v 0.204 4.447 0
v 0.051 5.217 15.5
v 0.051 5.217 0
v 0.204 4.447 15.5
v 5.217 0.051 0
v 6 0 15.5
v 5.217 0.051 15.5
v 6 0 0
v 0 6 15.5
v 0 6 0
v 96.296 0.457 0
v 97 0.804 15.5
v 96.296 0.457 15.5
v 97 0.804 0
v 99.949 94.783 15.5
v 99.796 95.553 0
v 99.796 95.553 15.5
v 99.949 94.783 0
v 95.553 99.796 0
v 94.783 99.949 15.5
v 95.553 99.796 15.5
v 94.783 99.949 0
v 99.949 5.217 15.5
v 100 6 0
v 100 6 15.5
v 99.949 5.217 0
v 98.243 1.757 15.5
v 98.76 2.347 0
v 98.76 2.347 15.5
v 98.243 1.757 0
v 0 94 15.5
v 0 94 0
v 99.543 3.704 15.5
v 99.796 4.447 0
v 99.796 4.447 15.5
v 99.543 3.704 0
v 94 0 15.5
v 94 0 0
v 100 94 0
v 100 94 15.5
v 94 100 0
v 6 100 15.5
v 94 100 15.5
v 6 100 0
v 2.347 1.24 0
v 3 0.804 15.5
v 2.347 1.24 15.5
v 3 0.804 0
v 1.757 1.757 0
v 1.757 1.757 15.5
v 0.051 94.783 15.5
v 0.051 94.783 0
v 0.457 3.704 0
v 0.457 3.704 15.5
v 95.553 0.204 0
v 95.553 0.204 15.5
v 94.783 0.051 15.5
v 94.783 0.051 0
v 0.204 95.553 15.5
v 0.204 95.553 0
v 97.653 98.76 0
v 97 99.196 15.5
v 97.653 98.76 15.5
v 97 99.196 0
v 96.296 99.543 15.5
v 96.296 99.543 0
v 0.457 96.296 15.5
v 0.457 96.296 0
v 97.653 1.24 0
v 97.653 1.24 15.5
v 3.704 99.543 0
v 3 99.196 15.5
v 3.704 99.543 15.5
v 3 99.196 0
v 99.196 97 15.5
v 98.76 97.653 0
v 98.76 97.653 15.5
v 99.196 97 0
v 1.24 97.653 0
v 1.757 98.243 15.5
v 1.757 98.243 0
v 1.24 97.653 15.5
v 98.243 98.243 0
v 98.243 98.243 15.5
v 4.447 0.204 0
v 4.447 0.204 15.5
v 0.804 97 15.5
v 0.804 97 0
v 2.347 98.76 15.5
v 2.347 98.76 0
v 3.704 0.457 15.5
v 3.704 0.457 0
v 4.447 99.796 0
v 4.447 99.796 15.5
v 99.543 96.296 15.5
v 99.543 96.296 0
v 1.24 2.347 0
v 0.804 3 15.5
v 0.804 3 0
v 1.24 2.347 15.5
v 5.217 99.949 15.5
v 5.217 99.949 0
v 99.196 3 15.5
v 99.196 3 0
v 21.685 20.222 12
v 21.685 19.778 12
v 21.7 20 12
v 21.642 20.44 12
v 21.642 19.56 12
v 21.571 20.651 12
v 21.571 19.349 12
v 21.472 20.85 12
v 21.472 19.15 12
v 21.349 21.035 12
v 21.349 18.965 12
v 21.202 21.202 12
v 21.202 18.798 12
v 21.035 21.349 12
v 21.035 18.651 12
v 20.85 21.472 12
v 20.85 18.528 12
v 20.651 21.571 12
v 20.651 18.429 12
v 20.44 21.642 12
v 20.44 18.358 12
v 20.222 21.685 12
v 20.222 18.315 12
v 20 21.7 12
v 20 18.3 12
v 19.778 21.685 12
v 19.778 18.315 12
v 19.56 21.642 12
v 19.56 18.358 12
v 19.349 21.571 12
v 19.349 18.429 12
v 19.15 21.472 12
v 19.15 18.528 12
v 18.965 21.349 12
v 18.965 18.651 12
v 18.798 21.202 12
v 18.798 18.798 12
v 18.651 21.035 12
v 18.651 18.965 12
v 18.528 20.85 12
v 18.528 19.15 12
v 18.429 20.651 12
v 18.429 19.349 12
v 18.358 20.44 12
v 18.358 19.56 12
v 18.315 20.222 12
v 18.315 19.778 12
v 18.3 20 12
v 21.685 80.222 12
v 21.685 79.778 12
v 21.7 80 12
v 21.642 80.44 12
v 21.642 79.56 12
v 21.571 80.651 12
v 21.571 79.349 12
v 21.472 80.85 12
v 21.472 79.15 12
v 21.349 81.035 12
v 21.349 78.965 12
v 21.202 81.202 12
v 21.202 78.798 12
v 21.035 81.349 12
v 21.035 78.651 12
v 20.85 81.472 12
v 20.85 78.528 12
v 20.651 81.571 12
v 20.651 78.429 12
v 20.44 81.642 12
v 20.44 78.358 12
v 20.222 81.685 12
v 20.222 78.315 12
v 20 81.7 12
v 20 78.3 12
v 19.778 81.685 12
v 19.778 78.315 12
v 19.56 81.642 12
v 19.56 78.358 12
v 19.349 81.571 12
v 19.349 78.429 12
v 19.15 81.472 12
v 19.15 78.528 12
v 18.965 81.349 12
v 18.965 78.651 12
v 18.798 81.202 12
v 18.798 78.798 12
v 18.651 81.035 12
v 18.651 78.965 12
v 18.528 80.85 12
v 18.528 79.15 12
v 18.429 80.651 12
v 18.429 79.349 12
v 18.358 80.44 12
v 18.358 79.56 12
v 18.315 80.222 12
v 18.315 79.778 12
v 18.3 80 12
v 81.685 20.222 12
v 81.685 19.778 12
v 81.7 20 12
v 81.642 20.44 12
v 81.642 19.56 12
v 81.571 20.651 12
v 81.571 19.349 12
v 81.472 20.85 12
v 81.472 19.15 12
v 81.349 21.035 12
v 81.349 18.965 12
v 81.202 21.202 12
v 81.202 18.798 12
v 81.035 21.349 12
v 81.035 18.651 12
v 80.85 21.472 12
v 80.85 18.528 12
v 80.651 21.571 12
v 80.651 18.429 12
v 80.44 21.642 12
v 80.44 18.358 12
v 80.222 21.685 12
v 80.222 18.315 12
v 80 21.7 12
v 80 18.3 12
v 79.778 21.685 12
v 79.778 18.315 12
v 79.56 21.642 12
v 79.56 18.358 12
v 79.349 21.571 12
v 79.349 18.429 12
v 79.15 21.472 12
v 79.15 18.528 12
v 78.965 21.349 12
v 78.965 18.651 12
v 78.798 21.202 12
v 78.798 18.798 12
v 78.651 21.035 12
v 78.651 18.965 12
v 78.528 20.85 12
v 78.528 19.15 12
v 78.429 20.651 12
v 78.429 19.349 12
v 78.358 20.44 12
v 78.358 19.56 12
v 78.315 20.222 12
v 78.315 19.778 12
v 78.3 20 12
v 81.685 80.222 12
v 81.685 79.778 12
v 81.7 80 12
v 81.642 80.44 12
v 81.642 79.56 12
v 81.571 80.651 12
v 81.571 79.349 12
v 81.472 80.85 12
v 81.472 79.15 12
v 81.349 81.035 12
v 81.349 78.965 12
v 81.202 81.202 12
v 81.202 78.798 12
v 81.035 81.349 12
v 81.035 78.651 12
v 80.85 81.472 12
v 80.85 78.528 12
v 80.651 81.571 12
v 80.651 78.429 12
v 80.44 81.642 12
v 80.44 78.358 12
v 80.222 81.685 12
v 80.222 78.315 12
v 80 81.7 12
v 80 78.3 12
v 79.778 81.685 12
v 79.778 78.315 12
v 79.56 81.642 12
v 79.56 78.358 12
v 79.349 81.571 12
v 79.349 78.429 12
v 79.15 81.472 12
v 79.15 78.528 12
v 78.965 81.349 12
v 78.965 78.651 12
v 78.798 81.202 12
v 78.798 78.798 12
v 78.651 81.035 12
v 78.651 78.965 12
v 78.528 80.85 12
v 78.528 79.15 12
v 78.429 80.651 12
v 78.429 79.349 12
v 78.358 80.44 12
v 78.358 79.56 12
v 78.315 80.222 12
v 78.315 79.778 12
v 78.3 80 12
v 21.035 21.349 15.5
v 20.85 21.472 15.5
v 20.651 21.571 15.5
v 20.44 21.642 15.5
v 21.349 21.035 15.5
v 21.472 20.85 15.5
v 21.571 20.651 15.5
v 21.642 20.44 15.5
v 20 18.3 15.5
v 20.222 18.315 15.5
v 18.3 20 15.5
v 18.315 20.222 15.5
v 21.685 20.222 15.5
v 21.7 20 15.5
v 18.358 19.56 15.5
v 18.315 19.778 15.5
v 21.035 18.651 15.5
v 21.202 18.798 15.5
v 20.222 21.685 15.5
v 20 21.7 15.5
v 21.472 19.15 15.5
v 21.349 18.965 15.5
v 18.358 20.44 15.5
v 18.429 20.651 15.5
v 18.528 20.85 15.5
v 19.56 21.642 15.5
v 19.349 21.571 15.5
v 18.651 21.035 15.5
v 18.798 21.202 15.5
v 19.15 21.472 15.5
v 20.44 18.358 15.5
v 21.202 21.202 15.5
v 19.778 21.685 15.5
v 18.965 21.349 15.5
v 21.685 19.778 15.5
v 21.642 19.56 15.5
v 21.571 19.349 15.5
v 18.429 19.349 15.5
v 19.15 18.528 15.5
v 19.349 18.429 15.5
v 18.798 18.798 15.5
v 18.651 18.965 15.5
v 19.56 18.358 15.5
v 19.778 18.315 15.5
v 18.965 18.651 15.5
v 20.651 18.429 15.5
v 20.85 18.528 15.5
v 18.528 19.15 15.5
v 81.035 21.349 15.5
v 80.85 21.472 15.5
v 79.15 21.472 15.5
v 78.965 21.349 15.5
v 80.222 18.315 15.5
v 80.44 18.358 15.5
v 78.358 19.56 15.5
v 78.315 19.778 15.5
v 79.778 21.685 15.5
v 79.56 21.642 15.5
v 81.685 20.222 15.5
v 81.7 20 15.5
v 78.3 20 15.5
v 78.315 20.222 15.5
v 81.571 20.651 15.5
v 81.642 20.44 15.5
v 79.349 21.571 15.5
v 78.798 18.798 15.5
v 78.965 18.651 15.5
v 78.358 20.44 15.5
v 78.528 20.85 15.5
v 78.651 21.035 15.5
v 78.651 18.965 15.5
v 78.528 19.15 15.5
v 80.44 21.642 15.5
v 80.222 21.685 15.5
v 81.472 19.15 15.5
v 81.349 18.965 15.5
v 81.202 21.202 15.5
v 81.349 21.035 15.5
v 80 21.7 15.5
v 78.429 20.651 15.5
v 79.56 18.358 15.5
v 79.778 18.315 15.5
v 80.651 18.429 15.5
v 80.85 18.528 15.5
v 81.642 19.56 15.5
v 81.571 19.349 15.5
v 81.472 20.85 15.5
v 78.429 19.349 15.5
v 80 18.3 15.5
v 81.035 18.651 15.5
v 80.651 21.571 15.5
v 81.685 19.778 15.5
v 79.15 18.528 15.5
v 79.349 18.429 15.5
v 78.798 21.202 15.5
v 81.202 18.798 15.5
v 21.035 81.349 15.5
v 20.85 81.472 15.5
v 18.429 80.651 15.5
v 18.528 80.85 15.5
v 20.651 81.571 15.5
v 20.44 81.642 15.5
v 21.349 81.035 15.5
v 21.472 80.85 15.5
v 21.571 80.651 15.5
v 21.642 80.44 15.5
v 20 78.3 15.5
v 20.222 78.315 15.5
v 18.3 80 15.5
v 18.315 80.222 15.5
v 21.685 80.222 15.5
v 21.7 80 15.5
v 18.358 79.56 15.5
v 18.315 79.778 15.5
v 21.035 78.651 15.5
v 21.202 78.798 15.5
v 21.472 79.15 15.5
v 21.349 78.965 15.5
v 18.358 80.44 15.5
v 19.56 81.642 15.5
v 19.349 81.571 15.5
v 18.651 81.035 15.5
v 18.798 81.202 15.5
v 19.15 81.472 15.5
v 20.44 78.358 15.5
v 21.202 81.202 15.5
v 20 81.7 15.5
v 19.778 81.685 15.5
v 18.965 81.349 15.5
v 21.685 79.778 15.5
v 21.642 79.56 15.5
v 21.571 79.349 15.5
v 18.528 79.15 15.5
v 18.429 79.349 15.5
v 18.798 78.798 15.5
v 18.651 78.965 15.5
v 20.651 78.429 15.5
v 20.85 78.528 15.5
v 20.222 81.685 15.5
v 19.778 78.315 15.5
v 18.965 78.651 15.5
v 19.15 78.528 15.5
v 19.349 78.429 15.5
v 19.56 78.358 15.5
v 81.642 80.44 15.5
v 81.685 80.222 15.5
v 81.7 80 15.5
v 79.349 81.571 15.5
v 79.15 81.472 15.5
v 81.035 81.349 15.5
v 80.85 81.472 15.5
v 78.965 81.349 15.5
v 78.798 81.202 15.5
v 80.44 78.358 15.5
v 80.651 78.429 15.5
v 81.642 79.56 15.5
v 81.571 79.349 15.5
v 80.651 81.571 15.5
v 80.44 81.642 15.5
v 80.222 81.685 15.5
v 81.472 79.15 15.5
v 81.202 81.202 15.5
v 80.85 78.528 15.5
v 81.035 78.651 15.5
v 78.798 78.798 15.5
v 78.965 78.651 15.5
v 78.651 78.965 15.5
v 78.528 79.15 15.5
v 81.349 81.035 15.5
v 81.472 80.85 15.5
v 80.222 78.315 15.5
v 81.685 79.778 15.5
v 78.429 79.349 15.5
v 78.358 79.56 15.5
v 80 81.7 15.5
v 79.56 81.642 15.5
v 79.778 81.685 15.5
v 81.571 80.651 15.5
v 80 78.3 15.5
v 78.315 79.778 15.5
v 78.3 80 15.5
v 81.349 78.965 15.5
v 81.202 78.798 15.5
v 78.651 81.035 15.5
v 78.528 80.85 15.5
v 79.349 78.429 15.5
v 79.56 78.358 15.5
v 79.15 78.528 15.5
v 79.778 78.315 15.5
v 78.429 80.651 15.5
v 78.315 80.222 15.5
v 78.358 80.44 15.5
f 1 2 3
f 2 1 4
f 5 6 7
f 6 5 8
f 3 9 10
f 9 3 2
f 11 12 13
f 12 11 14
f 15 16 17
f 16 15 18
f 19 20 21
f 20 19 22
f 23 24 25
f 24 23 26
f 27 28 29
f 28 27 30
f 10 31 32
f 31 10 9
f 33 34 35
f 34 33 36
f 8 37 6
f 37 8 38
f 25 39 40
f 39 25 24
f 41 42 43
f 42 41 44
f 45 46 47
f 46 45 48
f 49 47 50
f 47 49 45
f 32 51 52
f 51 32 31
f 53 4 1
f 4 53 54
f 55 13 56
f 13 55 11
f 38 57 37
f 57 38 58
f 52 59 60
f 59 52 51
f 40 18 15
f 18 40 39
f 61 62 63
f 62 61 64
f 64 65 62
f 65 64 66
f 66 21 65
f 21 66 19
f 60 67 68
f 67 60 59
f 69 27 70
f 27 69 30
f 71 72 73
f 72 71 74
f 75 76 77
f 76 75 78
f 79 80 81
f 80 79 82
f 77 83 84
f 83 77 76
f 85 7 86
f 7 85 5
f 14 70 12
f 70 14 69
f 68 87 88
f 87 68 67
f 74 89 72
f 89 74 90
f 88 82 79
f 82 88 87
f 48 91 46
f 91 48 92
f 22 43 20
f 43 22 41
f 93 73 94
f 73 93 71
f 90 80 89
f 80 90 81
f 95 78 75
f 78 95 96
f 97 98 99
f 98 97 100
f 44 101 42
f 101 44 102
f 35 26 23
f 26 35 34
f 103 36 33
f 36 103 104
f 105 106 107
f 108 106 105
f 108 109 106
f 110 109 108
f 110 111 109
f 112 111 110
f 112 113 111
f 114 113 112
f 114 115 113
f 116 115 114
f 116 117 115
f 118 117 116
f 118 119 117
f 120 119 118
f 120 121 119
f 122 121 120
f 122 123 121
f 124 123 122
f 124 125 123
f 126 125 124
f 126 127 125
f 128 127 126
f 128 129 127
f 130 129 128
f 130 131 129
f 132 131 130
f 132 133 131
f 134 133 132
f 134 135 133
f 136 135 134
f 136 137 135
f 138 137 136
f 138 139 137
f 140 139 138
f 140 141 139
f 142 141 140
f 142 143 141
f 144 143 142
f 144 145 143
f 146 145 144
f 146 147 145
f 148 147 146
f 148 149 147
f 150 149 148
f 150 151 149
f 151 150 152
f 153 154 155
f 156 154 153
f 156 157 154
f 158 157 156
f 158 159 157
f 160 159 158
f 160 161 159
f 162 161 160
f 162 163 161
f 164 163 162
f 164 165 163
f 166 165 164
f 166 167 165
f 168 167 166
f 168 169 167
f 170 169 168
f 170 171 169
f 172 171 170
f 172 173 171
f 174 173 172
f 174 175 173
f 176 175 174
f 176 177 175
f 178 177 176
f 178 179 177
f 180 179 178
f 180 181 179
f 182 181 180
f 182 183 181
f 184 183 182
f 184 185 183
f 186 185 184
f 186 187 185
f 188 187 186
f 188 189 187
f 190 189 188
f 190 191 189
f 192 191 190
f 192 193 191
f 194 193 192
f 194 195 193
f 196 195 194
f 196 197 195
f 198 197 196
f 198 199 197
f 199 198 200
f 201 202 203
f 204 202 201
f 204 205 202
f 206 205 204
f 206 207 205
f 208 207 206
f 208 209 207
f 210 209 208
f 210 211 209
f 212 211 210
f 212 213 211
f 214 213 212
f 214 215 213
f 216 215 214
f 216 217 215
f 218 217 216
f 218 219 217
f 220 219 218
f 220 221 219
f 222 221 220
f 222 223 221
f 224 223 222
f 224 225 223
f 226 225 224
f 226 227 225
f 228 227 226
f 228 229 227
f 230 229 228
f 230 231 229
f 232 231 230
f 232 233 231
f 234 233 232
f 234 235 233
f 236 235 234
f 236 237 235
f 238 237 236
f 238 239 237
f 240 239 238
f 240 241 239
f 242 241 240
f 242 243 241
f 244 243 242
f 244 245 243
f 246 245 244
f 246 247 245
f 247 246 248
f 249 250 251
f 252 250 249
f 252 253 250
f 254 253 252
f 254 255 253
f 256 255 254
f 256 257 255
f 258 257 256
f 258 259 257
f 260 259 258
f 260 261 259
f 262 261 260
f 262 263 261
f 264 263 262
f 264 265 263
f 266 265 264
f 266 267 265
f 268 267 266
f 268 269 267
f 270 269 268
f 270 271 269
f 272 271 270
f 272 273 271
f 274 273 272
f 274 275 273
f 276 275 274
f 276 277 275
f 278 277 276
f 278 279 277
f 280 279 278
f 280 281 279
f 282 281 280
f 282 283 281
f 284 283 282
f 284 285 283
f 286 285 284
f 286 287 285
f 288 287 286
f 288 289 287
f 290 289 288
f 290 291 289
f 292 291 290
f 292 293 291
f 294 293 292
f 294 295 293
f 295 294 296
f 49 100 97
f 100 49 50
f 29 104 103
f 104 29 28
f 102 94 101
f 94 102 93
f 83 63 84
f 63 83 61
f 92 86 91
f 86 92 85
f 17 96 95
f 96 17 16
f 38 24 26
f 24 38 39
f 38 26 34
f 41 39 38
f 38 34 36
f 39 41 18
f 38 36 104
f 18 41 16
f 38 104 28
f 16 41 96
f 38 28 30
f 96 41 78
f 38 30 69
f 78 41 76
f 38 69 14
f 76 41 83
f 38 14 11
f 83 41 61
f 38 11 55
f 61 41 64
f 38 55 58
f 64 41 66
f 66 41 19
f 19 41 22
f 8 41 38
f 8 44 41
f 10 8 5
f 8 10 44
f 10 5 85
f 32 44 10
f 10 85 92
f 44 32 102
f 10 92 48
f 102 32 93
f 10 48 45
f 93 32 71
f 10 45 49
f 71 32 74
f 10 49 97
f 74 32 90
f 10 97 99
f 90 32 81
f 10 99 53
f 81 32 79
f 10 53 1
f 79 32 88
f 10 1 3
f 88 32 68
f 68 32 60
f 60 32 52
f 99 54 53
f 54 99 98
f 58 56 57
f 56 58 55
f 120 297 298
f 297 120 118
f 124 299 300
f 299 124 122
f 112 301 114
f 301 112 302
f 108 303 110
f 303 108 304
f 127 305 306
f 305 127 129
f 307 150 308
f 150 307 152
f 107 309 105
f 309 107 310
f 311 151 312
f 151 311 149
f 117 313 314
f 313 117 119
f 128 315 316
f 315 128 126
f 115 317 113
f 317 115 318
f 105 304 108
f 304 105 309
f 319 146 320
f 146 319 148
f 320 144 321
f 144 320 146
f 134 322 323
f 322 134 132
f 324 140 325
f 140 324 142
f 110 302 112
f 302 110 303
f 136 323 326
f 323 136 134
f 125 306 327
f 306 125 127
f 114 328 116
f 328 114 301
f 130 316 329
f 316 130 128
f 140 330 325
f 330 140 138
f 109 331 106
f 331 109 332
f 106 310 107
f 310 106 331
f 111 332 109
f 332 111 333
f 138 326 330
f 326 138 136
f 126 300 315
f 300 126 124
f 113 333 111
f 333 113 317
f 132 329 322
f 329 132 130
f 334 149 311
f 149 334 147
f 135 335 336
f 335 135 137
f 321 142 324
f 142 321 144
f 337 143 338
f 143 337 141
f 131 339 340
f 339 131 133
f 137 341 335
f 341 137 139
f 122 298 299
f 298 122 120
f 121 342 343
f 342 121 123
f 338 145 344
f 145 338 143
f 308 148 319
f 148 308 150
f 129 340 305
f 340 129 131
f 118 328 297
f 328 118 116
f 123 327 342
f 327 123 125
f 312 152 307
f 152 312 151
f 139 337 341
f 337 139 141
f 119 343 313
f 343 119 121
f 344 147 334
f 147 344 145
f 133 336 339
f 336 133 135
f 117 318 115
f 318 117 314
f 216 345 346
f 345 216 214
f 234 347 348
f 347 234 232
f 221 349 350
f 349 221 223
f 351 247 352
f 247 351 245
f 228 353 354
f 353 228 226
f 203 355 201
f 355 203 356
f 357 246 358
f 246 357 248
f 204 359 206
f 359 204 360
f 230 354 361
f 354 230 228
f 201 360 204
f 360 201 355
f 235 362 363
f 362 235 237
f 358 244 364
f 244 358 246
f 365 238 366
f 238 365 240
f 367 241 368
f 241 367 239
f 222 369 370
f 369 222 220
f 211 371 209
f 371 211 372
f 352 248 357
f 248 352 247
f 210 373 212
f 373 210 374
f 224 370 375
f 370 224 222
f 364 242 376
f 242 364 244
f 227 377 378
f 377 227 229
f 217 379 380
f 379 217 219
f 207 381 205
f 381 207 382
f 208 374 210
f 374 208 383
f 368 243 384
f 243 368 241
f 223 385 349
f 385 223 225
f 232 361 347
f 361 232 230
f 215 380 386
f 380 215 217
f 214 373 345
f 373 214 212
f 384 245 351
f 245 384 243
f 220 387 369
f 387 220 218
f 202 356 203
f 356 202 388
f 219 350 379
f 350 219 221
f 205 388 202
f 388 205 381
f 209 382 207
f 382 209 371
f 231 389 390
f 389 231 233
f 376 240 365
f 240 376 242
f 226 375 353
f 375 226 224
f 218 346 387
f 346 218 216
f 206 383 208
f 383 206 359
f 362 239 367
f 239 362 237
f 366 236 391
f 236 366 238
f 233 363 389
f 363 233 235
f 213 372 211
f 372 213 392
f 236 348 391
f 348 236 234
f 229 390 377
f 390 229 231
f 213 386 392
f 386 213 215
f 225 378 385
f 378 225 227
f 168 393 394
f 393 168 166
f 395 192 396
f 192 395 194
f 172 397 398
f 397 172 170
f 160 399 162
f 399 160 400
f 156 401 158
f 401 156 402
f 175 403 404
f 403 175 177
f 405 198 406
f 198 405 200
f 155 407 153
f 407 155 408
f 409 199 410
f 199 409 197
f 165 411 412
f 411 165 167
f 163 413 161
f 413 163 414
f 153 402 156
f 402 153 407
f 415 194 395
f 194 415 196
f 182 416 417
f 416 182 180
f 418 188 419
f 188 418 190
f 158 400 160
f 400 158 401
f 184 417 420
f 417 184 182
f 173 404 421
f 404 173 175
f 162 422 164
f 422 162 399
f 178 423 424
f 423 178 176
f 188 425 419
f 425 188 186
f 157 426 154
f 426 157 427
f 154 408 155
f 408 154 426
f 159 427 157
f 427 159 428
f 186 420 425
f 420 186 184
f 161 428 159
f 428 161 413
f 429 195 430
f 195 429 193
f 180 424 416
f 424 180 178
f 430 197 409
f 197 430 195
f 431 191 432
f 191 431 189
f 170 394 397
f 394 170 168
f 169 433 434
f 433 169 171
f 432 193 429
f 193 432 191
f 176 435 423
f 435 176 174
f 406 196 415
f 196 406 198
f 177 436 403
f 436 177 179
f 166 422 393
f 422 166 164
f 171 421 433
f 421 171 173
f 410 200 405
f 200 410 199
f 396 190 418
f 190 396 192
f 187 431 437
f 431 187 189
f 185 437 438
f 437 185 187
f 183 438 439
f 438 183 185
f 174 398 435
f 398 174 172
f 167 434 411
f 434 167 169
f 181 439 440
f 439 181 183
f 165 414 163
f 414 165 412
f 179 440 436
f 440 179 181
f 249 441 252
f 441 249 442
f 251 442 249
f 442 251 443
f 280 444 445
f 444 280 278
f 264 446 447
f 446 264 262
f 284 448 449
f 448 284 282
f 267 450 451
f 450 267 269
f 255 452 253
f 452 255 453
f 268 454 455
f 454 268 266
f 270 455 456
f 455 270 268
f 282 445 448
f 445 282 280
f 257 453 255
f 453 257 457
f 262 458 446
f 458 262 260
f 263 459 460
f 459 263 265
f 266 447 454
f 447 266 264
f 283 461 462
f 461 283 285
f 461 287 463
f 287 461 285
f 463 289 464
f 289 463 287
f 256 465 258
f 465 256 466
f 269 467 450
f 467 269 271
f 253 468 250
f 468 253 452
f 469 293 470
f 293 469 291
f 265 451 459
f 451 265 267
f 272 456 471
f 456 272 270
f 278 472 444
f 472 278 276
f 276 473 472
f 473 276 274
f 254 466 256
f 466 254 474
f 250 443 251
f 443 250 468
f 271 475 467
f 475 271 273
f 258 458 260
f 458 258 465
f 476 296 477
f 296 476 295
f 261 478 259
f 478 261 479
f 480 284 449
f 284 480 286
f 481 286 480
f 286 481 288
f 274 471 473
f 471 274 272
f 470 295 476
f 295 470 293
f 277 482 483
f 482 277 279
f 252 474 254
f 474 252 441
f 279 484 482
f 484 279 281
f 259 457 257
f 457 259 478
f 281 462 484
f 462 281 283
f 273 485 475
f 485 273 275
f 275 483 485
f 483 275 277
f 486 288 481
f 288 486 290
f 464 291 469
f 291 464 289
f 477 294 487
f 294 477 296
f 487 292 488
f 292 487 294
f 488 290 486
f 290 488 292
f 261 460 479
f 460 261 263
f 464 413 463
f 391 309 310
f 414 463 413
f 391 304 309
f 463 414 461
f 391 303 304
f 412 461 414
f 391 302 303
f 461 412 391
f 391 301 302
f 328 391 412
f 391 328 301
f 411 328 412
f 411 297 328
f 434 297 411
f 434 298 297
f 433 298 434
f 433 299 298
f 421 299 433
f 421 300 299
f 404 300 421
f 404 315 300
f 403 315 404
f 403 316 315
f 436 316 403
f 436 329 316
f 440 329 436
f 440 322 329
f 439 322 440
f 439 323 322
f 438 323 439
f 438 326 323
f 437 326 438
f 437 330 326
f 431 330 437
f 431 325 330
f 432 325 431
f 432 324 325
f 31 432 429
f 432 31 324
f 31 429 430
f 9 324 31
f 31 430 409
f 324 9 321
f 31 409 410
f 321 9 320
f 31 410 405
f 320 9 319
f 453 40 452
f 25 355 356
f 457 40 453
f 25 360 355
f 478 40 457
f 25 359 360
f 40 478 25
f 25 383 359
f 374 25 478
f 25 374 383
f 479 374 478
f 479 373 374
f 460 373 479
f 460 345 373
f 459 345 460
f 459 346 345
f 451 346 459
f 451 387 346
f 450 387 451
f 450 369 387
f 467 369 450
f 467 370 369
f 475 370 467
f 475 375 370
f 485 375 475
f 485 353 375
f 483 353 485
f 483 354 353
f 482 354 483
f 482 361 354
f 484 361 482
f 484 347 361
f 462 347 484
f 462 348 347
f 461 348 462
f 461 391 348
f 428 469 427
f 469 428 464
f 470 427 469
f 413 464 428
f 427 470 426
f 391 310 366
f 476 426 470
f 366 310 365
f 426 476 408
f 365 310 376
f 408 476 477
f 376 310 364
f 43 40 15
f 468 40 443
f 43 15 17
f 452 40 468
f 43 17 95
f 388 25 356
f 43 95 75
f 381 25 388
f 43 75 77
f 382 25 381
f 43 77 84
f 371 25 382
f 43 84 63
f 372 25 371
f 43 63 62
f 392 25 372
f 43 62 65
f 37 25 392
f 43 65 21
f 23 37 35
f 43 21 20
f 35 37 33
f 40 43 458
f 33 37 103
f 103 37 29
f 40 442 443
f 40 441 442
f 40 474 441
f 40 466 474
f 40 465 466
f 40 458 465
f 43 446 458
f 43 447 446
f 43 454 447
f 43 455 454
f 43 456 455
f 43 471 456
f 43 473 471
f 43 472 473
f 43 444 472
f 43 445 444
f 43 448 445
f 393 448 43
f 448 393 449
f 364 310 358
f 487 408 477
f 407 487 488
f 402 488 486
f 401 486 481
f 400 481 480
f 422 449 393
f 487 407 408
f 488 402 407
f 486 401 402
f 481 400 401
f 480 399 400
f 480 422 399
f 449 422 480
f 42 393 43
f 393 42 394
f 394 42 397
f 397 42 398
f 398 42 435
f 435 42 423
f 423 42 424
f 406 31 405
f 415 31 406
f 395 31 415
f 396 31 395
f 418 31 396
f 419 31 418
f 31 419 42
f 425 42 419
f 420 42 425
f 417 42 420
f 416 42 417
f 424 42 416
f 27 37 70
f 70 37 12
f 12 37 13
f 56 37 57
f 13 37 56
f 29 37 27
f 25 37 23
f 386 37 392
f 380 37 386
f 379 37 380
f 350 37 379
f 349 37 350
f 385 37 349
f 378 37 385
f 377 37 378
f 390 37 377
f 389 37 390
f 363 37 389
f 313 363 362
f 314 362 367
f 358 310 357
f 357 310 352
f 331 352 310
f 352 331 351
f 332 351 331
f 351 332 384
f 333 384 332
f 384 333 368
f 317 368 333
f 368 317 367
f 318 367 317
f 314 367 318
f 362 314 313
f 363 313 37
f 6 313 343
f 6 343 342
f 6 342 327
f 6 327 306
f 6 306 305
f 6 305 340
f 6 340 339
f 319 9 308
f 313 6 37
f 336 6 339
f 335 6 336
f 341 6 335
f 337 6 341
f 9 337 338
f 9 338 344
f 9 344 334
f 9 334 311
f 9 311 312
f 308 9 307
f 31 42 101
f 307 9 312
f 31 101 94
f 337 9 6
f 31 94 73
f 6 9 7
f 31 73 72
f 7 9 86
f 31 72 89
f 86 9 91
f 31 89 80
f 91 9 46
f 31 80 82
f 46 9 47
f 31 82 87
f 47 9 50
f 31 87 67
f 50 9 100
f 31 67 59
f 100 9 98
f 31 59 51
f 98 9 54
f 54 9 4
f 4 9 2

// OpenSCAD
// file: lib/case_lib.scad
// =============================================================================
//  Ignitor — biblioteca OpenSCAD das caixas
//  Depende de ../params.scad
// =============================================================================
include <../params.scad>;

// ---- 2D / 3D primitives ---------------------------------------------------
module rrect(w, d, r) {
    rr = min(r, min(w, d) / 2 - 0.01);
    hull() {
        translate([rr, rr]) circle(r = rr);
        translate([w - rr, rr]) circle(r = rr);
        translate([rr, d - rr]) circle(r = rr);
        translate([w - rr, d - rr]) circle(r = rr);
    }
}

module rbox(w, d, h, r) {
    linear_extrude(height = h) rrect(w, d, r);
}

module ring2d(w, d, r, t) {
    difference() {
        rrect(w, d, r);
        rrect(w - 2 * t, d - 2 * t, r - t);
    }
}

// ---- Body shell -----------------------------------------------------------
module body_shell(W, D, H, wall, floor, rim, r) {
    difference() {
        rbox(W, D, H, r);
        translate([wall, wall, floor])
            rbox(W - 2 * wall, D - 2 * wall, H, r - wall);
    }
    // assento da gaxeta: rebaixo interno de 2.5 mm no topo
    translate([0, 0, H - 2.5])
        difference() {
            rbox(W - 2 * wall, D - 2 * wall, 2.5, r - wall);
            translate([rim - wall, rim - wall, -EPS])
                rbox(W - 2 * rim, D - 2 * rim, 2.5 + 2 * EPS, r - rim);
        }
}

module groove_cut(W, D, wall, r, H, gd) {
    translate([0, 0, H - gd])
        difference() {
            linear_extrude(height = gd + EPS)
                rrect(W - 2 * (wall + 0.75), D - 2 * (wall + 0.75), r - wall - 0.75);
            translate([0, 0, -EPS])
                linear_extrude(height = gd + 2 * EPS)
                    rrect(W - 2 * (wall + 4.25), D - 2 * (wall + 4.25), r - wall - 4.25);
        }
}

// ---- Fixacao ---------------------------------------------------------------
module screw_bosses(W, D, H, inset, list) {
    for (p = list)
        translate([p[0], p[1], 0])
            difference() {
                cylinder(h = H, d = SCREW_D);
                translate([0, 0, H - INSERT_H])
                    cylinder(h = INSERT_H + EPS, d = INSERT_D);
            }
}

module board_standoffs(pos, h, holes) {
    for (p = holes)
        translate([p[0], p[1], FLOOR])
            difference() {
                cylinder(h = h, d = BOARD_STANDOFF_D);
                translate([0, 0, h - 5])
                    cylinder(h = 5 + EPS, d = BOARD_HOLE_D);
            }
}

module bottom_door_bosses(W, D, list) {
    for (p = list)
        translate([p[0], p[1], 0])
            difference() {
                cylinder(h = 6, d = SCREW_D);
                translate([0, 0, -EPS])
                    cylinder(h = 6 + 2 * EPS, d = INSERT_D);
            }
}

// ---- Lid -----------------------------------------------------------------
module lid_plate(W, D, t, r, lip_outer, lip_inner, lip_h, screws_list) {
    union() {
        difference() {
            rbox(W, D, t, r);
            for (p = screws_list)
                translate([p[0], p[1], t - SCREW_HEAD_H])
                    cylinder(h = SCREW_HEAD_H + EPS, d = SCREW_HEAD_D);
        }
        // lip que entra no corpo
        translate([lip_outer, lip_outer, -lip_h])
            difference() {
                rbox(W - 2 * lip_outer, D - 2 * lip_outer, lip_h, r - lip_outer);
                translate([lip_inner - lip_outer, lip_inner - lip_outer, -EPS])
                    rbox(W - 2 * lip_inner, D - 2 * lip_inner, lip_h + 2 * EPS,
                         r - lip_inner);
            }
    }
}

module speaker_grille(cx, cy, z, d, hole_d, pitch, n) {
    for (i = [-n : n])
        for (j = [-n : n])
            if (i * i + j * j <= n * n)
                translate([cx + i * pitch, cy + j * pitch, z])
                    cylinder(h = LID_T + 2 * EPS, d = hole_d);
}

// ---- Cutouts -------------------------------------------------------------
module front_cut(x, z, w, h, wall) {
    translate([x, -EPS, z]) cube([w, wall + 2 * EPS, h]);
}

module right_cut(y, z, w, h, W, wall) {
    translate([W - wall - EPS, y, z]) cube([wall + 2 * EPS, w, h]);
}

module left_cut(y, z, w, h, wall) {
    translate([-EPS, y, z]) cube([wall + 2 * EPS, w, h]);
}

module back_hole(x, z, d, D, wall) {
    translate([x, D + EPS, z]) rotate([90, 0, 0])
        cylinder(h = wall + 2 * EPS, d = d);
}

module bottom_hole(x, y, d) {
    translate([x, y, -EPS]) cylinder(h = FLOOR + 2 * EPS, d = d);
}

module bottom_rect(x, y, w, d) {
    translate([x, y, -EPS]) rbox(w, d, FLOOR + 2 * EPS, 3);
}

// ---- Board / components (envelopes) --------------------------------------
module board_model(pos) {
    color("ForestGreen")
        translate(pos)
            difference() {
                cube([BOARD_W, BOARD_D, BOARD_T]);
                for (p = board_holes(pos))
                    translate([p[0] - pos[0], p[1] - pos[1], -EPS])
                        cylinder(h = BOARD_T + 2 * EPS, d = BOARD_HOLE_D);
            }
    // Q1 TO-220
    color("DimGray")
        translate([pos[0] + 56.5, pos[1] + 15.5, pos[2] + BOARD_T])
            cube([10, 5, 28.5]);
    // ESP32 DevKit (USB na borda de +Y local)
    color("RoyalBlue")
        translate([pos[0] + 18, pos[1] + 26.5, pos[2] + BOARD_T])
            cube([25.4, 48.5, 18]);
    // LoRa RA-02
    color("Purple")
        translate([pos[0] + 11, pos[1] + 28, pos[2] + BOARD_T])
            cube([33, 24, 3]);
    // conectores da borda direita
    for (y = [45, 49, 53, 56, 60, 65, 28, 16])
        color("Orange")
            translate([pos[0] + 71, pos[1] + y, pos[2] + BOARD_T])
                cube([4, 3, 7]);
    // J6 / J9 (borda inferior local)
    for (x = [61, 65])
        color("Orange")
            translate([pos[0] + x, pos[1] + 0.5, pos[2] + BOARD_T])
                cube([2.5, 2.5, 7]);
    // J11 OLED
    color("Orange")
        translate([pos[0] + 3, pos[1] + 62, pos[2] + BOARD_T])
        cube([5, 5, 7]);
}

module battery_2p(pos, size) {
    color("DarkOrange")
        translate(pos) cube(size);
}

module battery_3s2p(pos, size) {
    color("FireBrick")
        translate(pos) cube(size);
}

module relay2(pos, size) {
    color("SteelBlue")
        translate(pos) cube(size);
}

module endstop_mod(pos, size) {
    color("Goldenrod")
        translate(pos) cube(size);
}

module speaker_mod(pos, d, h) {
    color("Black")
        translate(pos)
            cylinder(h = h, d = d);
}

module oled_mod(pos, size) {
    color("MidnightBlue")
        translate(pos) cube(size);
}

module button_mod(pos, d, h) {
    color("Crimson")
        translate(pos) rotate([-90, 0, 0]) cylinder(h = h, d = d);
}

module guarded_switch(pos) {
    color("Red")
        translate(pos) cube([30, 30, 45]);
}

module rbf_flag(pos, size) {
    color("Red")
        translate(pos) cube(size);
}

module sma_mod(pos) {
    color("Silver")
        translate(pos) rotate([90, 0, 0]) cylinder(h = 12, d = 9);
}

module vent_mod(pos) {
    color("LightGray")
        translate(pos) rotate([0, 90, 0]) cylinder(h = 12, d = 12);
}

module fuse_wago(pos) {
    color("DarkGreen")
        translate(pos) cube([20, 30, 10]);
}

module bms_mod(pos, size) {
    color("DarkSlateGray")
        translate(pos) cube(size);
}
// main file
// =============================================================================
//  Cupons de ensaio — gaxeta e inserto M3
//  part = 0 assembly | 1 gasket frame | 2 gasket lid | 3 insert coupon
// =============================================================================
include <lib/case_lib.scad>;

part = 0;

COUPON_SCREWS = [[20, 20], [80, 20], [20, 80], [80, 80]];

module gasket_frame() {
    difference() {
        union() {
            body_shell(100, 100, 12, 10, 4, 15, 6);
            screw_bosses(100, 100, 12, 20, COUPON_SCREWS);
        }
        groove_cut(100, 100, 10, 6, 12, GROOVE_D);
    }
}

module gasket_lid() {
    difference() {
        rbox(100, 100, 3.5, 6);
        for (p = COUPON_SCREWS)
            translate([p[0], p[1], -EPS])
                cylinder(h = 3.5 + 2 * EPS, d = 3.4);
    }
}

module insert_coupon() {
    difference() {
        union() {
            rbox(70, 20, 5, 3);
            for (x = [15, 35, 55])
                translate([x, 10, 0]) cylinder(h = 10, d = 7);
        }
        for (x = [15, 35, 55])
            translate([x, 10, 3]) cylinder(h = 7 + EPS, d = 4.2);
    }
}

module assembly() {
    color("WhiteSmoke", 0.5) gasket_frame();
    color("Gainsboro", 0.5) translate([0, 0, 12]) gasket_lid();
    color("SteelBlue", 0.5) translate([15, 0, 0]) insert_coupon();
}

if (part == 1) gasket_frame();
else if (part == 2) gasket_lid();
else if (part == 3) insert_coupon();
else assembly();
